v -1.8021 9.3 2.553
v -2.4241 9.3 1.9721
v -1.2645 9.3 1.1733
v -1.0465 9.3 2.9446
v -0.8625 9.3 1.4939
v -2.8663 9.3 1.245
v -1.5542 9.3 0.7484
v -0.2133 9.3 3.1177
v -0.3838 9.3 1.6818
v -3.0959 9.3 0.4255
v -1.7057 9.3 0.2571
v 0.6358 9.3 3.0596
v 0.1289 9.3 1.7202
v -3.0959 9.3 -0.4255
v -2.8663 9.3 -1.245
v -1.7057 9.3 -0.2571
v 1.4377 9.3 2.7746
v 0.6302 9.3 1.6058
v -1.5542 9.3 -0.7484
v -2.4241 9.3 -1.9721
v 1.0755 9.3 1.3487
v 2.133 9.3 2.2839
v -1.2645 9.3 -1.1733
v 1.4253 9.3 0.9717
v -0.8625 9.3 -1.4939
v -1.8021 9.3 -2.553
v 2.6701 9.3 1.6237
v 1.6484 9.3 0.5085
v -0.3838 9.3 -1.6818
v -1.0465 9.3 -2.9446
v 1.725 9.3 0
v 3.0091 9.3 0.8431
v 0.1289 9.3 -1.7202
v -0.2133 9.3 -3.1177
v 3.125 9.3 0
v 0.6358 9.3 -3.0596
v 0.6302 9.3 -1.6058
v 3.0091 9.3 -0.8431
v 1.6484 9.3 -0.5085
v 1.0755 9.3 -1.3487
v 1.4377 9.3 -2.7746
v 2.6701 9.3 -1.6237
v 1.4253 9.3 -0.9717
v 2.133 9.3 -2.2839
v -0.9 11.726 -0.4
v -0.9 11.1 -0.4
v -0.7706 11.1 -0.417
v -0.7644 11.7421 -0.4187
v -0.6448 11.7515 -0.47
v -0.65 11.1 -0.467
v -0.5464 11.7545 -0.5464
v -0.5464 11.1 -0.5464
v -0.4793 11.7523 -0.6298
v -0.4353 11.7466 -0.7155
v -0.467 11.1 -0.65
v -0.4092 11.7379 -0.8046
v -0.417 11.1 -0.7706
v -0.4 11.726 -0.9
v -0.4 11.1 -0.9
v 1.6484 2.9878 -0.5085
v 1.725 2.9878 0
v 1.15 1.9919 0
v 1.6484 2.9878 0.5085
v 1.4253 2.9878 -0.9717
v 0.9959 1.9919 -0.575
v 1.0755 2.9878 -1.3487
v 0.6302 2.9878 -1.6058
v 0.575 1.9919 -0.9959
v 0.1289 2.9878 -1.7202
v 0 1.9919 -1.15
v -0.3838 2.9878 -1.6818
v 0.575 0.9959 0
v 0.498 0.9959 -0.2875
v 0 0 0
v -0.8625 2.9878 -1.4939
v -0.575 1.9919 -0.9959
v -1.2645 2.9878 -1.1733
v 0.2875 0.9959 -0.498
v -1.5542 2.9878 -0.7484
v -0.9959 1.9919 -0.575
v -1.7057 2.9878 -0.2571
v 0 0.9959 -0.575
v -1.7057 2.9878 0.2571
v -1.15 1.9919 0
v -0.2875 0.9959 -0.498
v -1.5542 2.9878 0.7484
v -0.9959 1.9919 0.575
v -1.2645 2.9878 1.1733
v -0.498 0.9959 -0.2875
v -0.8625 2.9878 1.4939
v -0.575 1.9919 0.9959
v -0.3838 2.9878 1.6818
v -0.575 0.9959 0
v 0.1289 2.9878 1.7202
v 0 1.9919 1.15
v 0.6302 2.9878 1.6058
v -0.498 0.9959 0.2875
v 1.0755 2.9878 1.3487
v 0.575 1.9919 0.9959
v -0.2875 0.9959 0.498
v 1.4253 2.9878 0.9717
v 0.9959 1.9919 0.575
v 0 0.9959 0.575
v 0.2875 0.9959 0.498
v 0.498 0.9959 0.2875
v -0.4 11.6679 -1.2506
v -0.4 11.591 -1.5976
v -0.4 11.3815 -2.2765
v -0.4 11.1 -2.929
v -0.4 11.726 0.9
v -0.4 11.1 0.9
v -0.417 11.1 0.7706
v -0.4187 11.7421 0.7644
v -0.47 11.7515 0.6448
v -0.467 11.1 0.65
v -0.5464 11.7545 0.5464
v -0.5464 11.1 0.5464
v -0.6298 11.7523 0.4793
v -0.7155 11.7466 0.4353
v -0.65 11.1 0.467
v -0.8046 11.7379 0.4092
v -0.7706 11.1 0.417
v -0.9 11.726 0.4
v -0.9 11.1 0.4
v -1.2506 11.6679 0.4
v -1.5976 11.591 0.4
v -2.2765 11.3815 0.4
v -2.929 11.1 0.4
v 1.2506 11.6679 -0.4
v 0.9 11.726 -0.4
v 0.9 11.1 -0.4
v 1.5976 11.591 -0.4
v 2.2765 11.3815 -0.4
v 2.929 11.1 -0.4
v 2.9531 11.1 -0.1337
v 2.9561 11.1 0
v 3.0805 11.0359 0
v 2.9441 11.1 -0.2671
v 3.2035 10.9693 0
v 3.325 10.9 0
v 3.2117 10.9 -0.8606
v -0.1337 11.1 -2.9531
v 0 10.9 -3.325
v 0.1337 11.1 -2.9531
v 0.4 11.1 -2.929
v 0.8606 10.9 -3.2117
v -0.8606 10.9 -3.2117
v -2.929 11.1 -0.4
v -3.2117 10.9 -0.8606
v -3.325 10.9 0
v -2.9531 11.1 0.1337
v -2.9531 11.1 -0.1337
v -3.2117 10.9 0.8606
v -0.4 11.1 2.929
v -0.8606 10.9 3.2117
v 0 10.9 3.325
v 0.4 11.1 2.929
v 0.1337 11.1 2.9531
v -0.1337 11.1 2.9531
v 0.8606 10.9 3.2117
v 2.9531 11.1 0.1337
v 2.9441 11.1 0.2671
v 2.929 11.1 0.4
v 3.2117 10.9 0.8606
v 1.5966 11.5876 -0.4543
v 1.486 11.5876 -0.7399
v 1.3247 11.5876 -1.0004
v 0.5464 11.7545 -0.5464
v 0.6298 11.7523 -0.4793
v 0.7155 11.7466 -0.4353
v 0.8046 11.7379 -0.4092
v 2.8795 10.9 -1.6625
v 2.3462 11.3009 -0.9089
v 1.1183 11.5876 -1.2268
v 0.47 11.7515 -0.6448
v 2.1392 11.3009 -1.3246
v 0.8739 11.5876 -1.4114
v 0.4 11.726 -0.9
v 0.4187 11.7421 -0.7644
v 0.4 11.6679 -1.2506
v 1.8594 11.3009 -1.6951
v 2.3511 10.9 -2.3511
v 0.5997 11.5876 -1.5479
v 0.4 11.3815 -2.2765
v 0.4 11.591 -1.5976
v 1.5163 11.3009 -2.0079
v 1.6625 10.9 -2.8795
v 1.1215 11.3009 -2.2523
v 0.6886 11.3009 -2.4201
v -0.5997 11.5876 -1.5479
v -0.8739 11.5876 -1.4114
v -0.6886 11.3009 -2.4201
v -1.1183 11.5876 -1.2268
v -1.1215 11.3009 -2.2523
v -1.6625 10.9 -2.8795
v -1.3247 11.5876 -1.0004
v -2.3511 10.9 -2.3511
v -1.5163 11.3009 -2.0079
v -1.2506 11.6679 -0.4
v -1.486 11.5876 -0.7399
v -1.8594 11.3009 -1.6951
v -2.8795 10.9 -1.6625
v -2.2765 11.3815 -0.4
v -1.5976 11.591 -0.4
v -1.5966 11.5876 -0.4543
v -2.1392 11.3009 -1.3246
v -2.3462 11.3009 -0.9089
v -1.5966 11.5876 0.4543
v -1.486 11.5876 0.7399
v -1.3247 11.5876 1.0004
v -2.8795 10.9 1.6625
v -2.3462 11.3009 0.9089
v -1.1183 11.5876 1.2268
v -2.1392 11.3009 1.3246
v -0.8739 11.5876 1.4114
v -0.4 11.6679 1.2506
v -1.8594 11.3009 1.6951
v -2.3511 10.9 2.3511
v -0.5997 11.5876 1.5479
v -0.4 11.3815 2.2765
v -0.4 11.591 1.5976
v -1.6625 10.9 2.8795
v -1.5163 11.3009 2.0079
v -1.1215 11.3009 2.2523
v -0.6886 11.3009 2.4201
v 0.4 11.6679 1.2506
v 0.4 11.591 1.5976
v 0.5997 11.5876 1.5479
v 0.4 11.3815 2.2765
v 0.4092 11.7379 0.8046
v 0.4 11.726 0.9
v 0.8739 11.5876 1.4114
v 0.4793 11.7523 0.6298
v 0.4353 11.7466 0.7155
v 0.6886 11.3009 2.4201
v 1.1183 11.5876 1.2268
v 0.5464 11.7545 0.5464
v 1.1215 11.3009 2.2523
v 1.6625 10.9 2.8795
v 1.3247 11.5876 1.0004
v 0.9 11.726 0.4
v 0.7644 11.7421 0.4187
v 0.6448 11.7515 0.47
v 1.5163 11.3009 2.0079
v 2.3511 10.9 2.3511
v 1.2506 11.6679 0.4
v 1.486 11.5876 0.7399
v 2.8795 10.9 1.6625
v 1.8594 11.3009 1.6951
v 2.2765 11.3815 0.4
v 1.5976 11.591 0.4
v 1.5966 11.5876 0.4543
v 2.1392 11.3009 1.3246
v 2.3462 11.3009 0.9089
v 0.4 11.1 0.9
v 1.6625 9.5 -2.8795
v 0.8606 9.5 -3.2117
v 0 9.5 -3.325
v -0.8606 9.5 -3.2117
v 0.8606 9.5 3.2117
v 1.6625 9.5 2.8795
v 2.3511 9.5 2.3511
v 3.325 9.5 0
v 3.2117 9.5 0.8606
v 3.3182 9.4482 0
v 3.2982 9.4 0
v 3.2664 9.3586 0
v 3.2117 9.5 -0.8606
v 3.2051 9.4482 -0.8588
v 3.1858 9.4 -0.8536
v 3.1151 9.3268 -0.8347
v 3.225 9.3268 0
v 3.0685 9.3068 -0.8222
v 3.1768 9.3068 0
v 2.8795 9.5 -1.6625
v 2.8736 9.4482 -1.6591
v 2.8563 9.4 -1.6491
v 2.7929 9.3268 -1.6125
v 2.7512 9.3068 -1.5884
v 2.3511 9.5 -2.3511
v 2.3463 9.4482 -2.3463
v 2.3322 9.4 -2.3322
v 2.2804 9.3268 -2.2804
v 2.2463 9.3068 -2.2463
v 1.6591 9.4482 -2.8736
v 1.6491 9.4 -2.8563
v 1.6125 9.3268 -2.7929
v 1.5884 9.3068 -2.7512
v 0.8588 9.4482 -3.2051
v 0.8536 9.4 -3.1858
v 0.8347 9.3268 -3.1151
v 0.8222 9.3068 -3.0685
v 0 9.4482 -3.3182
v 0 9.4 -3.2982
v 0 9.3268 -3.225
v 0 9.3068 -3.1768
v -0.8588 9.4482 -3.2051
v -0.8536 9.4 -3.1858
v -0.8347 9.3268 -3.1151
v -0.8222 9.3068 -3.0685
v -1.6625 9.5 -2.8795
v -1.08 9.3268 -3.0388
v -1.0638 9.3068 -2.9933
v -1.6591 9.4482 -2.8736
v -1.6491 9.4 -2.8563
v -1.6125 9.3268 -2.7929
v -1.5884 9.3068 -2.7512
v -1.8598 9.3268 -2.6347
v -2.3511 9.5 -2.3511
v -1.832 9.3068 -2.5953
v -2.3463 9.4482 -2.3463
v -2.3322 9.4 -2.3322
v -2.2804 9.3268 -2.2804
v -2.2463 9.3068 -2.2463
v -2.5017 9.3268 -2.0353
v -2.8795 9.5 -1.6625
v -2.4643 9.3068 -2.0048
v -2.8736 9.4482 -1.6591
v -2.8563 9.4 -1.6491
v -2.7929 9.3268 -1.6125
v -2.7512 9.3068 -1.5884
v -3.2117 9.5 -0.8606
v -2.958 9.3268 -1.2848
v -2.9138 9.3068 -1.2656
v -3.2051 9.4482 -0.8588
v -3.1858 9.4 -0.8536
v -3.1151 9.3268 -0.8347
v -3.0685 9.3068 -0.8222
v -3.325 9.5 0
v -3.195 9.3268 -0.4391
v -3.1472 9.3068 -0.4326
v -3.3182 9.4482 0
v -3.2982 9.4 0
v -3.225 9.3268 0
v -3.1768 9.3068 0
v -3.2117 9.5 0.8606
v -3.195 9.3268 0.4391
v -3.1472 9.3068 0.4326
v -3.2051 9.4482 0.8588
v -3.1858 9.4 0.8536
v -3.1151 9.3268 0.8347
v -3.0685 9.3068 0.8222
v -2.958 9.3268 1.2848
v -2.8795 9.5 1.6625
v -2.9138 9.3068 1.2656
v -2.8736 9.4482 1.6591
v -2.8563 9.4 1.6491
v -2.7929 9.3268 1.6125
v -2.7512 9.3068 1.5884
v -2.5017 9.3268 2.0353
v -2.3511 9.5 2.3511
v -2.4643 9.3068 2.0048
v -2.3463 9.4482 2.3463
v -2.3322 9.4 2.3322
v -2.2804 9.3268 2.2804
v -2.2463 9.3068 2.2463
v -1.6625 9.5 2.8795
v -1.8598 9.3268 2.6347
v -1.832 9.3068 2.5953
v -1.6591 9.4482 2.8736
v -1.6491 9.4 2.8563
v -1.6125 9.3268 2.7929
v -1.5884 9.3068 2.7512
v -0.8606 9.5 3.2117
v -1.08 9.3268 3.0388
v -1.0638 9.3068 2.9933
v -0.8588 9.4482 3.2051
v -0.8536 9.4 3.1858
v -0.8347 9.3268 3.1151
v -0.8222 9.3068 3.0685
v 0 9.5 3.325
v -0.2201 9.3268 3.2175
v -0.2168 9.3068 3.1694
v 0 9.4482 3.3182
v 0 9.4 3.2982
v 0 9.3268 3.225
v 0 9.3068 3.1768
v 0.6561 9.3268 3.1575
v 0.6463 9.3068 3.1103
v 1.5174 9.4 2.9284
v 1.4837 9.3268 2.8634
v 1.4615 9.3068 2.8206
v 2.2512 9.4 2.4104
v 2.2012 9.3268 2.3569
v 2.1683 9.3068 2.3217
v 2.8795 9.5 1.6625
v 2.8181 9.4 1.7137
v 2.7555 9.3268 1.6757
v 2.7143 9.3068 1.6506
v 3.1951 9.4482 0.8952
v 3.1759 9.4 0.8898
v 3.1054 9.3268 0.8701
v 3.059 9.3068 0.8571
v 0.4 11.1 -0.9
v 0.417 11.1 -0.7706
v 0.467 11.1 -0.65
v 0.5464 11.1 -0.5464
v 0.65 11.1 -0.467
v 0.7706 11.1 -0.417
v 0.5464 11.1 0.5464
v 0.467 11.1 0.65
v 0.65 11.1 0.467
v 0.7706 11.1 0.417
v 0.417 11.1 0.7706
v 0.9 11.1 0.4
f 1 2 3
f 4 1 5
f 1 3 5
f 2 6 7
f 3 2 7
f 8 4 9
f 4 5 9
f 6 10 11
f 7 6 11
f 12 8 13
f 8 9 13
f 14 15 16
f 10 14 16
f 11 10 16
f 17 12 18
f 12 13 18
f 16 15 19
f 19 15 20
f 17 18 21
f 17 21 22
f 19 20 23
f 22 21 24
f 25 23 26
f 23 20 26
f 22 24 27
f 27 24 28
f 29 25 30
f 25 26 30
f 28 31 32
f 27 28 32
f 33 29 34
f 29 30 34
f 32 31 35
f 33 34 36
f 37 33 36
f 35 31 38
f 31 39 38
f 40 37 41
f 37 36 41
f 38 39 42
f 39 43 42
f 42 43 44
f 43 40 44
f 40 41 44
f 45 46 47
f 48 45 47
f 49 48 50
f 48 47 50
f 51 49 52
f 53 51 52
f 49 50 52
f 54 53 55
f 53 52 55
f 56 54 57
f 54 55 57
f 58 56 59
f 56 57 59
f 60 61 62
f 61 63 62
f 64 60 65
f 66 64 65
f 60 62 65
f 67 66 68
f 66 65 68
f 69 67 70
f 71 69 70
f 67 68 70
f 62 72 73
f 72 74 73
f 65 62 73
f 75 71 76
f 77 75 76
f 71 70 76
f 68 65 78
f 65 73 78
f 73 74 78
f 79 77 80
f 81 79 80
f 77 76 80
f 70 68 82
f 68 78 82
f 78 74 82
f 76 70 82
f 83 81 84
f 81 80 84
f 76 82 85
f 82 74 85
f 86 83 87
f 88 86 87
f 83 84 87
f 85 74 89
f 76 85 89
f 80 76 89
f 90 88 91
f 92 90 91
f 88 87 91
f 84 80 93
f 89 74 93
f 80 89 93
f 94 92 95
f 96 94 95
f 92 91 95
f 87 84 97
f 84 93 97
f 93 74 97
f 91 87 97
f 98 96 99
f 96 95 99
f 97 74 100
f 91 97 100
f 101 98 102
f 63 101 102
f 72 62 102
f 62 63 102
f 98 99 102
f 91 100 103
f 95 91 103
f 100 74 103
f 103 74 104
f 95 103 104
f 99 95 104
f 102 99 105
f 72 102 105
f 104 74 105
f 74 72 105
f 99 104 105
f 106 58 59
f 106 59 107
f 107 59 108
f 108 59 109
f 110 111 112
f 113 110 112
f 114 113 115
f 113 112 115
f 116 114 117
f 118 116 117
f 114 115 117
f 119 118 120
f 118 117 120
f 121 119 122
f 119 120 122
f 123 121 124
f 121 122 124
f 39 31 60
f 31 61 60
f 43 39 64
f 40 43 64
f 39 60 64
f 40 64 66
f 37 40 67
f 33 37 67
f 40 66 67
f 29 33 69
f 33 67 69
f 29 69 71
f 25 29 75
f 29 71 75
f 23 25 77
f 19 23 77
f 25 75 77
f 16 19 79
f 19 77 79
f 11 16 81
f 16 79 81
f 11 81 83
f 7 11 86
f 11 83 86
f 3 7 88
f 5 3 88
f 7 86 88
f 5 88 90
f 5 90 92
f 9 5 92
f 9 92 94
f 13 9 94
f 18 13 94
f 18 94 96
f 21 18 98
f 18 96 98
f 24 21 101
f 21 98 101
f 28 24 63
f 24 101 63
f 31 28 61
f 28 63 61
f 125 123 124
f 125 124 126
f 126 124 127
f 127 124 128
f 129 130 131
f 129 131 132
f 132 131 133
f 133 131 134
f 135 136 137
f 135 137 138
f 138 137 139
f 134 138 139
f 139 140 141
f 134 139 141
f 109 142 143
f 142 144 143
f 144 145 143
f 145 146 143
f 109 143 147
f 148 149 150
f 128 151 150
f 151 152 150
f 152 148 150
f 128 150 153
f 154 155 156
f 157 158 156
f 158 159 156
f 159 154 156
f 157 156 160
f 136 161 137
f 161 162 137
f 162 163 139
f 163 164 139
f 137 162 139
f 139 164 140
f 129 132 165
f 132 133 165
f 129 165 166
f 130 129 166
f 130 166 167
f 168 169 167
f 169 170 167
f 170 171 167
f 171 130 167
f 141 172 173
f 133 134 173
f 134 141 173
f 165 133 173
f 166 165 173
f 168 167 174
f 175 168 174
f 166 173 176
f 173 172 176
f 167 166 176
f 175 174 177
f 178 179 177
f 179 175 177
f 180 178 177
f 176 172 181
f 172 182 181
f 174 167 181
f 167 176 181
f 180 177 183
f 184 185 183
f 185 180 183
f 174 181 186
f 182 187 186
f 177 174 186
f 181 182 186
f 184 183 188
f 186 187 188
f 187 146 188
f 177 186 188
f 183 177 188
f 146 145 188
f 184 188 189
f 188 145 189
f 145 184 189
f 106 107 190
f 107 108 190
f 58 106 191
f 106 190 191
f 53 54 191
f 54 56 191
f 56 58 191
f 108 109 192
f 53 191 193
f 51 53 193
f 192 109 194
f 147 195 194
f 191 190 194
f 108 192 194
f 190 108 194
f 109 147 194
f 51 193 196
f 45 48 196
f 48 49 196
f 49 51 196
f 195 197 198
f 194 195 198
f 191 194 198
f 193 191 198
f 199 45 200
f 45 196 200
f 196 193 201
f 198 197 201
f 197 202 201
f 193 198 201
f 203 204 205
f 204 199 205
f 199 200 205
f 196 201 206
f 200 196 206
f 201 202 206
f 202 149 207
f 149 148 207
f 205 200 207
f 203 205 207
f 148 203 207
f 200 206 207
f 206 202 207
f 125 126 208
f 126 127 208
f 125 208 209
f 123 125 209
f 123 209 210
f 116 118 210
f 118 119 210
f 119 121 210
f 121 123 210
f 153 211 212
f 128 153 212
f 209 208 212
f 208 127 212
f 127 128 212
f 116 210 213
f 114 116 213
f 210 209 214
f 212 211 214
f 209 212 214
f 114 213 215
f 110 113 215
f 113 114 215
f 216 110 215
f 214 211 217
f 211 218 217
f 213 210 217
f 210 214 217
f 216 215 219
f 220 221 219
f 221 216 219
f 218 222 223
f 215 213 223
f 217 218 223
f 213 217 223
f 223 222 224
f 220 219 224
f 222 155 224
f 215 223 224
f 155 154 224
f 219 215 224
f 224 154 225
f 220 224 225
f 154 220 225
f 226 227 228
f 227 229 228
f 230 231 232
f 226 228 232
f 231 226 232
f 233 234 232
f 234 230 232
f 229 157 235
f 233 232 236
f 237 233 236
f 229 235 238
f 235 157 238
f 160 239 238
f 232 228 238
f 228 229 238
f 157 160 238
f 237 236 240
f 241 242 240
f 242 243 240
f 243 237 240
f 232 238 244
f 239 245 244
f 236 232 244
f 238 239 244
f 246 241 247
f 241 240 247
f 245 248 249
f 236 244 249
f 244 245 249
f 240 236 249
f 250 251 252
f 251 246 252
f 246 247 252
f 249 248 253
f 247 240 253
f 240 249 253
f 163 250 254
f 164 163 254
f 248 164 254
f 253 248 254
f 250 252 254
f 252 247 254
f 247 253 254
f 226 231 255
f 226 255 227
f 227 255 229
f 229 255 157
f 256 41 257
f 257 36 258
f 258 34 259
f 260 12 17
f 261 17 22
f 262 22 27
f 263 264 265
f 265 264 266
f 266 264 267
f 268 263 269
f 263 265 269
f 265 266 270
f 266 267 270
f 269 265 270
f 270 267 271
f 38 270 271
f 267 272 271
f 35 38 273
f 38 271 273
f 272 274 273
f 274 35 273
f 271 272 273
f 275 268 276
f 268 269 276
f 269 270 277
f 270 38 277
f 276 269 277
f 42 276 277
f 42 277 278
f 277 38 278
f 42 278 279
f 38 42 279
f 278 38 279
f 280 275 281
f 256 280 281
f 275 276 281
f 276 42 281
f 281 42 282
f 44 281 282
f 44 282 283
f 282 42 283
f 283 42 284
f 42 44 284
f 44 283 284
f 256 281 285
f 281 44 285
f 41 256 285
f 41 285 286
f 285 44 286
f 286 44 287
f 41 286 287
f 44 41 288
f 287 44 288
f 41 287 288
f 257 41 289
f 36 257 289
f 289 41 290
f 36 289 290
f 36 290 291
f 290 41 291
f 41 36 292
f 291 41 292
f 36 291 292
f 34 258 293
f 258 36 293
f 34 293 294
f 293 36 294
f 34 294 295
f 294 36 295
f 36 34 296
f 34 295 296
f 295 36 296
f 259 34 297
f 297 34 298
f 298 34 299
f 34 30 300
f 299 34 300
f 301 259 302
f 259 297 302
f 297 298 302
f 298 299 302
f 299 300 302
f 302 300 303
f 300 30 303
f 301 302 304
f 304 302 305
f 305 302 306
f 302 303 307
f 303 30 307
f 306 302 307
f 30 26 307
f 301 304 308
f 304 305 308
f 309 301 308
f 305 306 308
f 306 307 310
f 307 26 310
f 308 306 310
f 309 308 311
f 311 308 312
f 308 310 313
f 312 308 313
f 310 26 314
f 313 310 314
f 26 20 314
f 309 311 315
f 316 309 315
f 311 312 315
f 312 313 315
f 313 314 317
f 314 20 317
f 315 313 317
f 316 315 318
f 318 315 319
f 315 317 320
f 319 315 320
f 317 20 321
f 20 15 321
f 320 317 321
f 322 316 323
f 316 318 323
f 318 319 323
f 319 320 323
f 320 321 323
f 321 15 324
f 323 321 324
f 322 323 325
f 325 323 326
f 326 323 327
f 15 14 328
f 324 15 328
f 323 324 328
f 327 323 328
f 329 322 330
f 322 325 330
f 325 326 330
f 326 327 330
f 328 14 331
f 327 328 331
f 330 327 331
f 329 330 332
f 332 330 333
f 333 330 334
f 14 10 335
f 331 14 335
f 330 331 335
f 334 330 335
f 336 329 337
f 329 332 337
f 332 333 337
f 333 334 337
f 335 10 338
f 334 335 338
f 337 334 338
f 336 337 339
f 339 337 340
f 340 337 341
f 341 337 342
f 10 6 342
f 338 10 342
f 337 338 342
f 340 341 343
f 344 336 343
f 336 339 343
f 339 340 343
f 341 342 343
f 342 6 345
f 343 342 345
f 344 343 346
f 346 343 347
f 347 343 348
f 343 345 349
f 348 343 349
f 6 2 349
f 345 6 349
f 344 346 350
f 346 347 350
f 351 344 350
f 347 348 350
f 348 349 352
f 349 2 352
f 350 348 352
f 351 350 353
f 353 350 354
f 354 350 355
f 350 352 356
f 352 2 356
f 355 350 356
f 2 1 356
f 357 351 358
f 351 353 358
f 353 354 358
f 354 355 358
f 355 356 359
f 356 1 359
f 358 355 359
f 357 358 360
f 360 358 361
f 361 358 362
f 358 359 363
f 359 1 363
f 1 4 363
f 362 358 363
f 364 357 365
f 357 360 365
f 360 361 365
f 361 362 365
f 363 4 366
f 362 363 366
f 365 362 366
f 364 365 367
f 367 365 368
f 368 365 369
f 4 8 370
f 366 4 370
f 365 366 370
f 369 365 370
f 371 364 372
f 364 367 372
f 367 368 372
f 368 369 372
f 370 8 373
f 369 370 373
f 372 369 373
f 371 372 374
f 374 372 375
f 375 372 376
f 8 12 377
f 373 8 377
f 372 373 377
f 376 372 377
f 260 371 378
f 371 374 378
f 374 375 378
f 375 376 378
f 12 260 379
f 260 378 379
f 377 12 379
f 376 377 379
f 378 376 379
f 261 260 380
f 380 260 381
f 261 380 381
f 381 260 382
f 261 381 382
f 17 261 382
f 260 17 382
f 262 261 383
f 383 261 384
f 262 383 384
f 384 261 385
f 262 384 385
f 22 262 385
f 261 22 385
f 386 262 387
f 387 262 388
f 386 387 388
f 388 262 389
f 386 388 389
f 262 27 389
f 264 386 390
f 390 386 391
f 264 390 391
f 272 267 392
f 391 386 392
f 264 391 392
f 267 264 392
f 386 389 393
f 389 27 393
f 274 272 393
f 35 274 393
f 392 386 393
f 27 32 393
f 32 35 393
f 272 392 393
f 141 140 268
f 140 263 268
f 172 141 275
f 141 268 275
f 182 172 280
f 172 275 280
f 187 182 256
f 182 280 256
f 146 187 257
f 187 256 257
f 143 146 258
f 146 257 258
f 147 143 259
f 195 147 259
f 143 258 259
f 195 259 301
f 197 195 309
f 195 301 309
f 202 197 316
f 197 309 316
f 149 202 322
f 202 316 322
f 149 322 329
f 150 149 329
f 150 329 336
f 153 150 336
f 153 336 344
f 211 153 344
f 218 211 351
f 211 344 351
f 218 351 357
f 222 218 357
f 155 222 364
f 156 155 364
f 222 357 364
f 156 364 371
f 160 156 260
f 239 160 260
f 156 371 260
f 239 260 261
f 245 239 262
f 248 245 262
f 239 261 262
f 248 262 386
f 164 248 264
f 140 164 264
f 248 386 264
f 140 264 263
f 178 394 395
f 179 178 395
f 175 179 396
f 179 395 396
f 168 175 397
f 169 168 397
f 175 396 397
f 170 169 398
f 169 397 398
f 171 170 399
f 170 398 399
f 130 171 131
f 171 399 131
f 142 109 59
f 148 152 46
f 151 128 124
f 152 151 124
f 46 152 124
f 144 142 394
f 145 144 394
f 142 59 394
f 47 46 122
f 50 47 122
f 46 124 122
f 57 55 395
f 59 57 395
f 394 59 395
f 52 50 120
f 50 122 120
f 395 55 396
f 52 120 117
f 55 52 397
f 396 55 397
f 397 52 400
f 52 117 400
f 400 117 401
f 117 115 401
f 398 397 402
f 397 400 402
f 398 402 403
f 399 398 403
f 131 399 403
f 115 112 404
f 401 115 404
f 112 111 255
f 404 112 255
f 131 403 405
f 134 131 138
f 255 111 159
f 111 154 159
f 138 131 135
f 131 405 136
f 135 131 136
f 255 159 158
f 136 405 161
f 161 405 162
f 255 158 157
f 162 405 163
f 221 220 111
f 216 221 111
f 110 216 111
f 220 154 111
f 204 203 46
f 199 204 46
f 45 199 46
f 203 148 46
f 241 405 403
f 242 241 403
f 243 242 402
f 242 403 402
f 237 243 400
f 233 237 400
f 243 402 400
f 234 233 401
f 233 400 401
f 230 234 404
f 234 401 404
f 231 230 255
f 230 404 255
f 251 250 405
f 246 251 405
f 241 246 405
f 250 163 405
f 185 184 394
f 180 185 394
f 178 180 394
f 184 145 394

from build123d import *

# Parameters (mm, degrees)
CORTAR_EXTRUIR1_START = -1.8
CORTAR_EXTRUIR1_DEPTH = 3


with BuildPart() as part:
    # Croquis1 → Revolución1 (revolve)
    with BuildSketch(Plane.XY):
        with BuildLine():
            Line((0, 0), (0, 11.8))
            ThreePointArc((0, 11.8), (1.722325826, 11.57102319), (3.325, 10.9))
            Line((3.325, 10.9), (3.325, 9.5))
            ThreePointArc((3.325, 9.5), (3.266421356, 9.358578644), (3.125, 9.3))
            Line((3.125, 9.3), (1.725, 9.3))
            Line((1.725, 9.3), (1.725, 2.987787643))
            Line((1.725, 2.987787643), (0, 0))
        make_face()
    revolve(axis=Axis((0, 0, 0), (0, 1, 0)))

    # Croquis2 → Cortar-Extruir1 (cut)
    with BuildSketch(Plane.XZ.offset(-9.3).offset(CORTAR_EXTRUIR1_START)):
        with BuildLine():
            Line((-0.4, 3.2), (-0.4, 0.9))
            ThreePointArc((-0.4, 0.9), (-0.546446609, 0.546446609), (-0.9, 0.4))
            Line((-0.9, 0.4), (-3.2, 0.4))
            Line((-3.2, 0.4), (-3.2, -0.4))
            Line((-3.2, -0.4), (-0.9, -0.4))
            ThreePointArc((-0.9, -0.4), (-0.546446609, -0.546446609), (-0.4, -0.9))
            Line((-0.4, -0.9), (-0.4, -3.2))
            Line((-0.4, -3.2), (0.4, -3.2))
            Line((0.4, -3.2), (0.4, -0.9))
            ThreePointArc((0.4, -0.9), (0.546446609, -0.546446609), (0.9, -0.4))
            Line((0.9, -0.4), (3.2, -0.4))
            Line((3.2, -0.4), (3.2, 0.4))
            Line((3.2, 0.4), (0.9, 0.4))
            ThreePointArc((0.9, 0.4), (0.546446609, 0.546446609), (0.4, 0.9))
            Line((0.4, 0.9), (0.4, 3.2))
            Line((0.4, 3.2), (-0.4, 3.2))
        make_face()
    extrude(amount=-CORTAR_EXTRUIR1_DEPTH, mode=Mode.SUBTRACT)


solid = part.part
